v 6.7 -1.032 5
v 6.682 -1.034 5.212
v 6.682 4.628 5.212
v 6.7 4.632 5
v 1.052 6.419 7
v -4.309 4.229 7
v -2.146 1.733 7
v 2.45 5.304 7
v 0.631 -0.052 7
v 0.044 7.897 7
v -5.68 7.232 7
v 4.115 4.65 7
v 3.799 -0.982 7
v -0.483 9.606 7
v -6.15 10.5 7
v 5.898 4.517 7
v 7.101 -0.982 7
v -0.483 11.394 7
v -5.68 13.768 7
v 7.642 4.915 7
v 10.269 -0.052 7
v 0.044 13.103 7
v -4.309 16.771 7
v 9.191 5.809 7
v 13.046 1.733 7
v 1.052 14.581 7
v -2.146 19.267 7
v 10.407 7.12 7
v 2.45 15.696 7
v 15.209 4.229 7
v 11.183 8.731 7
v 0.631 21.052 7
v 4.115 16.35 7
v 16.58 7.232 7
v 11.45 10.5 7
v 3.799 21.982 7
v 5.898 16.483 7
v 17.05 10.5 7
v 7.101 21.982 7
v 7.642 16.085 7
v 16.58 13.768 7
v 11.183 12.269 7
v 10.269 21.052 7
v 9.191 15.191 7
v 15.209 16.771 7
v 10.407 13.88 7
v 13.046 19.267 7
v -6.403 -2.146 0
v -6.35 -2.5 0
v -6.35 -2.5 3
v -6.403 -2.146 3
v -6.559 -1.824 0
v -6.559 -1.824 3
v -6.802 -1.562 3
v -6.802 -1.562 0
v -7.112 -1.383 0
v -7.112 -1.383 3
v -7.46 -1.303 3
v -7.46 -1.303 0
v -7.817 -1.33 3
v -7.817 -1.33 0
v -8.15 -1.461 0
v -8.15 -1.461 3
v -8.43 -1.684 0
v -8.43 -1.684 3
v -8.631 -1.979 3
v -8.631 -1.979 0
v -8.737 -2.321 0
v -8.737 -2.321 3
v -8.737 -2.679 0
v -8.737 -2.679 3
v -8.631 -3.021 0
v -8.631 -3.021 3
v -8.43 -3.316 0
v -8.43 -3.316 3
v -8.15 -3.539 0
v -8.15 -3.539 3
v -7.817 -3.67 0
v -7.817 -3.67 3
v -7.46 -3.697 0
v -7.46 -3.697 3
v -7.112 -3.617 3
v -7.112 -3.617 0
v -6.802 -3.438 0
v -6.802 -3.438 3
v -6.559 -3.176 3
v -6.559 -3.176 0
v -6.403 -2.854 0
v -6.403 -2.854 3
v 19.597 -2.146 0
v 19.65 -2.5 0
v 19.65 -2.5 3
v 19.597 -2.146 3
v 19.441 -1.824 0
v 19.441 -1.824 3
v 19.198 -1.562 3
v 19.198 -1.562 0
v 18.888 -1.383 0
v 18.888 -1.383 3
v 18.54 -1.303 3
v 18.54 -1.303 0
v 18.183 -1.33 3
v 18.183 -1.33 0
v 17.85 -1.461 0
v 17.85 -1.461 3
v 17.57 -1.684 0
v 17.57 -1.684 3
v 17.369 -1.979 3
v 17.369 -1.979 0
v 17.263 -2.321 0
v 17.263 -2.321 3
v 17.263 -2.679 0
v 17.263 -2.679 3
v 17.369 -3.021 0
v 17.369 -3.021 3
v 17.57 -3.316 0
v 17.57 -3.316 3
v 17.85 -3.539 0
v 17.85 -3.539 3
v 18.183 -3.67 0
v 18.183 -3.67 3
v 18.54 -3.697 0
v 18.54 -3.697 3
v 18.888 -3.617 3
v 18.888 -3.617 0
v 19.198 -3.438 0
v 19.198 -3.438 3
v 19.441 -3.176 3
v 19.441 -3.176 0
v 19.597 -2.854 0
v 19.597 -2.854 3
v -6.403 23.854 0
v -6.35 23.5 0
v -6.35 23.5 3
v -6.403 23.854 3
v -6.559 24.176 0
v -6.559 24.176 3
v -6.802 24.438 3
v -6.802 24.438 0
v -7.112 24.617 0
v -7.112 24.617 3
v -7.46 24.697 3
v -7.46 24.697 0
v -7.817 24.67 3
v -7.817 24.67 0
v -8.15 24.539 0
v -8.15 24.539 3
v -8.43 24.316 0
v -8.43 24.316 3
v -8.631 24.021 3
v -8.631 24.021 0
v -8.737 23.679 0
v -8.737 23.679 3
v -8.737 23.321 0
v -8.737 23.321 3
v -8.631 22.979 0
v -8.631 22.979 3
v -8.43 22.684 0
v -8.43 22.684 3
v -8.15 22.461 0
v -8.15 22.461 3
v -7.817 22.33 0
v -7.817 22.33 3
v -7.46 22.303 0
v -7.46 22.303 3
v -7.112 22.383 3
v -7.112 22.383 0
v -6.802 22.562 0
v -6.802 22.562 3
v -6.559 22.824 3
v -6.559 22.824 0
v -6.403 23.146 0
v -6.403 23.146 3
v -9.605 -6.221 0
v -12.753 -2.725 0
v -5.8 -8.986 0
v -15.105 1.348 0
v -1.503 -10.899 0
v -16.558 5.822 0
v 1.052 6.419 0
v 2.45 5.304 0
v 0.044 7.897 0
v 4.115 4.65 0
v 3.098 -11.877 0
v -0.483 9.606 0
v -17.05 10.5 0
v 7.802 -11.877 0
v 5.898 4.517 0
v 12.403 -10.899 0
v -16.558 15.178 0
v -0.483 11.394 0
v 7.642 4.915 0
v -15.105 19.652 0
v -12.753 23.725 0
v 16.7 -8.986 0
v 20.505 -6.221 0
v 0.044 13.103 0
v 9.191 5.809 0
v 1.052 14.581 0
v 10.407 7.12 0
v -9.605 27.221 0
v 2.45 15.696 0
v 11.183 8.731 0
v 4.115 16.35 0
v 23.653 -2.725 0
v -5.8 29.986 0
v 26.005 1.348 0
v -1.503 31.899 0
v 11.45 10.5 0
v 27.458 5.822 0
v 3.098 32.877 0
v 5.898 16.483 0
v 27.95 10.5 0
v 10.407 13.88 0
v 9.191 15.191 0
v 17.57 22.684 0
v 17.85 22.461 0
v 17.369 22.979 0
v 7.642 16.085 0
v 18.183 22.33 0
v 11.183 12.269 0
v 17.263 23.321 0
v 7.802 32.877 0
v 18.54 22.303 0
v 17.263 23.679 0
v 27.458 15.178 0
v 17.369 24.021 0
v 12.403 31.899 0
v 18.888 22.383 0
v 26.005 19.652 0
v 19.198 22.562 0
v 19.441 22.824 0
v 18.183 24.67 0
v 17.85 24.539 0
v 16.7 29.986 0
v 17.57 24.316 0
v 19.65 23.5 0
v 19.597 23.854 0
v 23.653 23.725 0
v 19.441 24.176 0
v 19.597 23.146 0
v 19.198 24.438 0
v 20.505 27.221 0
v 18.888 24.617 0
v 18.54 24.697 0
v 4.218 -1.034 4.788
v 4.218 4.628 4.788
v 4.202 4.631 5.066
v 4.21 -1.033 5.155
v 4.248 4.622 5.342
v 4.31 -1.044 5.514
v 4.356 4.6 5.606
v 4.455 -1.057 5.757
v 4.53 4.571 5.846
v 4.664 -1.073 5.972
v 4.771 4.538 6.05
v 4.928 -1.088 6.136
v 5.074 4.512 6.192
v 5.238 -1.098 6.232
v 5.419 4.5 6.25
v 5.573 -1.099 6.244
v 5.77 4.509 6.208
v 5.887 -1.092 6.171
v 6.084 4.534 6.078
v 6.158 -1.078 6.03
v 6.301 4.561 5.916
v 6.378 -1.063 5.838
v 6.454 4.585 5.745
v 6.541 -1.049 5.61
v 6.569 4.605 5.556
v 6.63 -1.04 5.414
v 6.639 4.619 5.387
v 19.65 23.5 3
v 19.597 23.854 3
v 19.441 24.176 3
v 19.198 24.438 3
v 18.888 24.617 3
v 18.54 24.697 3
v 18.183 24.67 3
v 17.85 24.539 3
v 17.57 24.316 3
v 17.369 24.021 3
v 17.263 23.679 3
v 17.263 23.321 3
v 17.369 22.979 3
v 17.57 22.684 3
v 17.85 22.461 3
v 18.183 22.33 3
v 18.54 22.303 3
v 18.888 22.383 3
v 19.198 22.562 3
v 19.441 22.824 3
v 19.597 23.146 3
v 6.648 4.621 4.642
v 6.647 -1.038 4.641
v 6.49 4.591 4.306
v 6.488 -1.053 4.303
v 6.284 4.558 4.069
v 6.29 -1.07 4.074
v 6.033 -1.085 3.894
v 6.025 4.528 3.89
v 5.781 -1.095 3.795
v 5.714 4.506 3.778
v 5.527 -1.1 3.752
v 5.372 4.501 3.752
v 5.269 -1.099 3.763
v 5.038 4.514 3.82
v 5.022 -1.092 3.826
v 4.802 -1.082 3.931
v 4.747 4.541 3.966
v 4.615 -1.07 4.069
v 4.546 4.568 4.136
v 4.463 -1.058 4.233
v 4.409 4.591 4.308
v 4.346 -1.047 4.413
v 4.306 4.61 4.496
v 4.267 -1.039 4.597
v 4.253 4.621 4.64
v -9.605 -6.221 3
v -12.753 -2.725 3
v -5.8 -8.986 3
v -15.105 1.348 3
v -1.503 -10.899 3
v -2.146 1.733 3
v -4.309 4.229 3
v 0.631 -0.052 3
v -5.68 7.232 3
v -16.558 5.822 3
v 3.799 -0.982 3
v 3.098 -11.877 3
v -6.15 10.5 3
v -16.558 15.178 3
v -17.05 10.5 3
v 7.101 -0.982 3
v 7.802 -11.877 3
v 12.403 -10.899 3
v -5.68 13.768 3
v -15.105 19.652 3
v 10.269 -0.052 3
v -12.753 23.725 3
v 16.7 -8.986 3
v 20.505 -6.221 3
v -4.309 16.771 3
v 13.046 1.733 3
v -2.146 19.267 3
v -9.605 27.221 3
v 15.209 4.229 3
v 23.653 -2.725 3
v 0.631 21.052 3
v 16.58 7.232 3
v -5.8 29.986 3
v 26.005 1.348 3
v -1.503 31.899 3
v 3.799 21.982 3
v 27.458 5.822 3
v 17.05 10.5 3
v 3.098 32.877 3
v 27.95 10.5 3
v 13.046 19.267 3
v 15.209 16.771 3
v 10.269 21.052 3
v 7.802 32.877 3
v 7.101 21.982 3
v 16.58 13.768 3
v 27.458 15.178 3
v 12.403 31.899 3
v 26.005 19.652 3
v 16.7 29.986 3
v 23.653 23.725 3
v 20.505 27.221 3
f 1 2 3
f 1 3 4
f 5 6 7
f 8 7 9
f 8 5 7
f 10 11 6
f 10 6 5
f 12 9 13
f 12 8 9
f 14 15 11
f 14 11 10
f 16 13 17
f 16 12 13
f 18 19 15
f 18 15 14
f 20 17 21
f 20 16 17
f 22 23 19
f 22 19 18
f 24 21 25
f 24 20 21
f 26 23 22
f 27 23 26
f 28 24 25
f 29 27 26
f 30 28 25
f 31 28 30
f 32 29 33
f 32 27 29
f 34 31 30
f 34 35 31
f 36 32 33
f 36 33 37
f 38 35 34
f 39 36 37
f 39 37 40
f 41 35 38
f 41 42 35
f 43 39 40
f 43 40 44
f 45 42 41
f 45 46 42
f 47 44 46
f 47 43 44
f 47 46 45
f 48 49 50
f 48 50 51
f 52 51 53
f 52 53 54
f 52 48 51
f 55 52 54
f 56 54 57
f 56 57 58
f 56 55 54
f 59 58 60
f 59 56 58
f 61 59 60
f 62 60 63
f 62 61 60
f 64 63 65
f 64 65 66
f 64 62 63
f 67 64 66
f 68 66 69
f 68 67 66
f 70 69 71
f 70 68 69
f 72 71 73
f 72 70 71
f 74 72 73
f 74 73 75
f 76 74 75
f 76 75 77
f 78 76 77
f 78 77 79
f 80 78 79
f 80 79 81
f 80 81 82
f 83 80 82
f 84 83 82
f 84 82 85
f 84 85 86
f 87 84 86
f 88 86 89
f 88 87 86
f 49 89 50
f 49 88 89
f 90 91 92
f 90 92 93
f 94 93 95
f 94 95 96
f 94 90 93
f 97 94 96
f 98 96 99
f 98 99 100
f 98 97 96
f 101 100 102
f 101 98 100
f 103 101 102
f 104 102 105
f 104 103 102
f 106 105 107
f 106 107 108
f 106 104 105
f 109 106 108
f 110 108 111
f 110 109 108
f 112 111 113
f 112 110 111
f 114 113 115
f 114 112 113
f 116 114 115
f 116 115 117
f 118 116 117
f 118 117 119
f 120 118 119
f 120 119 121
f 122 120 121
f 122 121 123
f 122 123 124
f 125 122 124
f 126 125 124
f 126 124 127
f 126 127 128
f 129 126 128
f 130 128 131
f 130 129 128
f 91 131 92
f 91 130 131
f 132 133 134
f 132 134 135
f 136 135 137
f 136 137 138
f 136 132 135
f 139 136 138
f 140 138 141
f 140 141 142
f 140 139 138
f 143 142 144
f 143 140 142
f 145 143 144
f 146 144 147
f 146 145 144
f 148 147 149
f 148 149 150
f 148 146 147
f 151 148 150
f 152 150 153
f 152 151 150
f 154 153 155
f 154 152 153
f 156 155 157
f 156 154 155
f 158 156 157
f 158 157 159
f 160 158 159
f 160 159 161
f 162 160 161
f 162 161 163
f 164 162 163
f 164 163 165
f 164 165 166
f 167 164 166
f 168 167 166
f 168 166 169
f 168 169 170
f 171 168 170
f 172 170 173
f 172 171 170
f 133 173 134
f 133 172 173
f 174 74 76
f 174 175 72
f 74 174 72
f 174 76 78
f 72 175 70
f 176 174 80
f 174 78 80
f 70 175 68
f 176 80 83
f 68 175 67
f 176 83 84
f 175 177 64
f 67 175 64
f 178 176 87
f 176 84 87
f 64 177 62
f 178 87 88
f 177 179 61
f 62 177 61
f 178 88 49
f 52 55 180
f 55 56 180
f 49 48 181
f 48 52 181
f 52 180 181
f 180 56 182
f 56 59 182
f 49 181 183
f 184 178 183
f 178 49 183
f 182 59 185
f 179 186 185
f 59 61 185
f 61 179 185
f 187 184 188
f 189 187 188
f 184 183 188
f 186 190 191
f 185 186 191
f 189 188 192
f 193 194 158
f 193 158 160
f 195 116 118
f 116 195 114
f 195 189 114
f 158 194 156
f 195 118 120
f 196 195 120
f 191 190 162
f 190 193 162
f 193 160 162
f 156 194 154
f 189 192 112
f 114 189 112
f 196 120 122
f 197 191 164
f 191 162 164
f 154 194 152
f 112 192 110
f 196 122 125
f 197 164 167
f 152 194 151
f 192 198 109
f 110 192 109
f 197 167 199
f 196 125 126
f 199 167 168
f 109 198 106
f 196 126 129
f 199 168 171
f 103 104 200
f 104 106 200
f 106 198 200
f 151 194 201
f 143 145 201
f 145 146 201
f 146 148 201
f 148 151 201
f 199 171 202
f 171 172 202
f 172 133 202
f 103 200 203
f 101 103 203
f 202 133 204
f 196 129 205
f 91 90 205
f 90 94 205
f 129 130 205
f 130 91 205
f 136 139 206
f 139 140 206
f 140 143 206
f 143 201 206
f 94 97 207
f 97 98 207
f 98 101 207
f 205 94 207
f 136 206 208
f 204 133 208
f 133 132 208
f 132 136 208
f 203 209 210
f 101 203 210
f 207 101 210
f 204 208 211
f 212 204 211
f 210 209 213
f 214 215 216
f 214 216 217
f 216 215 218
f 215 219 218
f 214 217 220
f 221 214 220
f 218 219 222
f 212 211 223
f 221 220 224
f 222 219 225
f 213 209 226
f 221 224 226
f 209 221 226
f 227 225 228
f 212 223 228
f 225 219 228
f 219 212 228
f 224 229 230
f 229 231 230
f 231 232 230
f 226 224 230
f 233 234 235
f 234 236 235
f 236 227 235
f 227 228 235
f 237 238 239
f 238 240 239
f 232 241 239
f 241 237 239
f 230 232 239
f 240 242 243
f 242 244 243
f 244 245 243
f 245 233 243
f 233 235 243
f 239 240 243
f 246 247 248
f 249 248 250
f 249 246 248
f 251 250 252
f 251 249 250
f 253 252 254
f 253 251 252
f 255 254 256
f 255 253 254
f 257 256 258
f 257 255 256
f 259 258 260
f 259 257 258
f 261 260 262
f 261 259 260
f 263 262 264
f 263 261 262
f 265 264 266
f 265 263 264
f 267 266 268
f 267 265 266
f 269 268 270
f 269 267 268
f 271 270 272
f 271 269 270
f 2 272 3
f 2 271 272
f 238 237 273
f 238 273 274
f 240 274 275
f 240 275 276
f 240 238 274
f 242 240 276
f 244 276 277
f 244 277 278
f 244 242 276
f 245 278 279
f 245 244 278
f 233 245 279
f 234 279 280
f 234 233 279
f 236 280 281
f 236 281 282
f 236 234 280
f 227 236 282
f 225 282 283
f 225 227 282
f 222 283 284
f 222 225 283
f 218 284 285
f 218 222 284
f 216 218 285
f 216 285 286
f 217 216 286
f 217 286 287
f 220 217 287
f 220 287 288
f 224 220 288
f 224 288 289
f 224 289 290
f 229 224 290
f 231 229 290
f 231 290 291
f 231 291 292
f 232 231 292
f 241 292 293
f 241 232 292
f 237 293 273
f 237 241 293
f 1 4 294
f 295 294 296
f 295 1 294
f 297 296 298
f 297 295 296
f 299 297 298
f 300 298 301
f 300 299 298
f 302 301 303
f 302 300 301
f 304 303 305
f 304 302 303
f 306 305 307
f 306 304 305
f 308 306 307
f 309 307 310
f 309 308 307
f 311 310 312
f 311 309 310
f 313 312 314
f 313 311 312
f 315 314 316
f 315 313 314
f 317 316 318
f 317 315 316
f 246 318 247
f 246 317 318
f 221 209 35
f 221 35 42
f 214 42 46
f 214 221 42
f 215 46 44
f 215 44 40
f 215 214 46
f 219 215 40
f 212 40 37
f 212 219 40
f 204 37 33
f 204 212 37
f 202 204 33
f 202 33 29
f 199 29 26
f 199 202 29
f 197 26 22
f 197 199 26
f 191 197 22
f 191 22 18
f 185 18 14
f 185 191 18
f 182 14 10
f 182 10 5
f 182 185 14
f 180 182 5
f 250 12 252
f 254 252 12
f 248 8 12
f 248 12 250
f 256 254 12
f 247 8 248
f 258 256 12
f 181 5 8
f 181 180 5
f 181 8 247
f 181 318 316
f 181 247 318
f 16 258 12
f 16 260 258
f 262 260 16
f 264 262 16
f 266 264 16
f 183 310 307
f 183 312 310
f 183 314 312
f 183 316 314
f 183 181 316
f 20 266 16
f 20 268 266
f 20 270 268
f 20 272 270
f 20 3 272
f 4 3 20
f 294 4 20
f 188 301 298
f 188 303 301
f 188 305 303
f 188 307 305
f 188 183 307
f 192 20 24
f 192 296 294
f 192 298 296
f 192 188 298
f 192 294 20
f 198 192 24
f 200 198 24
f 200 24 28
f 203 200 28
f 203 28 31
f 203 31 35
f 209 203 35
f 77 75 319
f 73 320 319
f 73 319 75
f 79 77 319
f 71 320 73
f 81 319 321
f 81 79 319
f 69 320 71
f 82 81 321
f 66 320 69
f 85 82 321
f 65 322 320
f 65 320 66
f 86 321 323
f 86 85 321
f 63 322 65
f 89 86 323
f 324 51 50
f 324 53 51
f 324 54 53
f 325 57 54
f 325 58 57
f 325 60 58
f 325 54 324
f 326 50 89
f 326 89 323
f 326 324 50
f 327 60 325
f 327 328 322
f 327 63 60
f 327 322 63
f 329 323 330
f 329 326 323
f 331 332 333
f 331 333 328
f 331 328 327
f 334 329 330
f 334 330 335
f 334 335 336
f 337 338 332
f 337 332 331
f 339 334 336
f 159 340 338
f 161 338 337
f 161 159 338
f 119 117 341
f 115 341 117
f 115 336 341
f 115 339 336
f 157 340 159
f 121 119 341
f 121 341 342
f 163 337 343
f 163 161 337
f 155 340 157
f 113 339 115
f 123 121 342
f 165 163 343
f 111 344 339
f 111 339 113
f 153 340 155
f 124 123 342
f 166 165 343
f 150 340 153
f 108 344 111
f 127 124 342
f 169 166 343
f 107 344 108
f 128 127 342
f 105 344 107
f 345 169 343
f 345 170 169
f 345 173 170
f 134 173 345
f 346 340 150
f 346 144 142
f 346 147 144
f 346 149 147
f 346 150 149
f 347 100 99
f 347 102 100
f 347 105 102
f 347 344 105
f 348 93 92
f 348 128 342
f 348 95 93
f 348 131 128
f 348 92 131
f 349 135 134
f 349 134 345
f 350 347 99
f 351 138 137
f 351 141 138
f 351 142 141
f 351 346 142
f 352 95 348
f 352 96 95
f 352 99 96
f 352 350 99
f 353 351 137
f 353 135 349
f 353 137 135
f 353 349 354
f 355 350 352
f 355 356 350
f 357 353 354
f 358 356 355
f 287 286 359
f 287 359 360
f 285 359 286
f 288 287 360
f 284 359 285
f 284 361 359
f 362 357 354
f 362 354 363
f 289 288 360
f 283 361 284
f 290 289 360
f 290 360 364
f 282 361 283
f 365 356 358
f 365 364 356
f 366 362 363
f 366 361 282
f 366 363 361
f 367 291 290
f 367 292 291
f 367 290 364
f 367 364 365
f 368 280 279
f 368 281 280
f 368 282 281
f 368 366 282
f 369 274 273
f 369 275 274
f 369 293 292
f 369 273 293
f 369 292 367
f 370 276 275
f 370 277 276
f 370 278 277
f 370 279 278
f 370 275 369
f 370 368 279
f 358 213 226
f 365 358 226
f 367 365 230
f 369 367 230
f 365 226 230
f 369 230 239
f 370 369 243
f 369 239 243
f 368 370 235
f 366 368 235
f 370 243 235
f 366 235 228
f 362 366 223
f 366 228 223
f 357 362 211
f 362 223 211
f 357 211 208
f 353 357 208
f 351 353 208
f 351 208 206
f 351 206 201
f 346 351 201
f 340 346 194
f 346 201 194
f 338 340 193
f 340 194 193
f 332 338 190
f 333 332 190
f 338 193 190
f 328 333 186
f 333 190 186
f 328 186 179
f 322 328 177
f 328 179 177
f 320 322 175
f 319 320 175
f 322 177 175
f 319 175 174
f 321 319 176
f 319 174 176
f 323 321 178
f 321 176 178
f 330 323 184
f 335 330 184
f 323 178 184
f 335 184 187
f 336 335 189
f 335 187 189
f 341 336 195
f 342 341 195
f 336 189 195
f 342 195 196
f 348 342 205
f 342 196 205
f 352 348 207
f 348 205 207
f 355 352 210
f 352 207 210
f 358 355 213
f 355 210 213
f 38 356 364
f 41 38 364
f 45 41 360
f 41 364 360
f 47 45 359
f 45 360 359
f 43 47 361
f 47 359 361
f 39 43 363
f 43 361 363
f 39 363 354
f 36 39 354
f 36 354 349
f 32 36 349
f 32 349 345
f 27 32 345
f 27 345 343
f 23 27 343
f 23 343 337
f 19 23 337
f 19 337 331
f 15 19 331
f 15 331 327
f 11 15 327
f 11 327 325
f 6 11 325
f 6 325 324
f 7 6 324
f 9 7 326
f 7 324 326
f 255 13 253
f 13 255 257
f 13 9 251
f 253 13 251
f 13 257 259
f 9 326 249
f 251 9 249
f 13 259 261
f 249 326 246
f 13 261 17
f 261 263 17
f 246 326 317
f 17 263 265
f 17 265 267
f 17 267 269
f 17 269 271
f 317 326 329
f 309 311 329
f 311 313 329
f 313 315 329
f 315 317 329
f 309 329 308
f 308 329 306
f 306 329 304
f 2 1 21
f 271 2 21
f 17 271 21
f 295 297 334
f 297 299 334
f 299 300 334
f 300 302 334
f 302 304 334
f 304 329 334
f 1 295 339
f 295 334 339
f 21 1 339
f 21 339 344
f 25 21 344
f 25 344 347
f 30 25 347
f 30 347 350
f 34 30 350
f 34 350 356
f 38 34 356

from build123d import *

# Parameters (mm, degrees)
SKETCH_1_R               = 22.5
SKETCH_1_R_2             = 6
SKETCH_1_R_3             = 1.2
EXTRUDE_1_DEPTH          = 3
SKETCH_3_R               = 11.6
SKETCH_3_R_2             = 7.6
EXTRUDE_2_DEPTH          = 4.2
CUT_EXTRUDE_START        = -0.2
SKETCH_4_R               = 11.6
CUT_EXTRUDE_1_DEPTH      = 0.2
SKETCH_5_R               = 7.6
SKETCH_5_R_2             = 6
EXTRUDE_3_DEPTH          = 4
CUT_EXTRUDE_2_DEPTH      = 10
CUT_EXTRUDE_2_DEPTH_BACK = 10


with BuildPart() as part:
    # 草图1 → 凸台-拉伸1 (new body)
    with BuildSketch(Plane.XY):
        with Locations((5.45, 10.5)):
            Circle(SKETCH_1_R)
        with Locations((5.45, 10.5)):
            Circle(SKETCH_1_R_2, mode=Mode.SUBTRACT)
        with Locations((-7.55, -2.5)):
            Circle(SKETCH_1_R_3, mode=Mode.SUBTRACT)
        with Locations((-7.55, 23.5)):
            Circle(SKETCH_1_R_3, mode=Mode.SUBTRACT)
        with Locations((18.45, 23.5)):
            Circle(SKETCH_1_R_3, mode=Mode.SUBTRACT)
        with Locations((18.45, -2.5)):
            Circle(SKETCH_1_R_3, mode=Mode.SUBTRACT)
    extrude(amount=EXTRUDE_1_DEPTH)

    # 草图3 → 凸台-拉伸2 (add)
    with BuildSketch(Plane.XY.offset(3)):
        with Locations((5.45, 10.5)):
            Circle(SKETCH_3_R)
        with Locations((5.45, 10.5)):
            Circle(SKETCH_3_R_2, mode=Mode.SUBTRACT)
    extrude(amount=EXTRUDE_2_DEPTH)

    # 草图4 → 切除-拉伸1 (cut)
    with BuildSketch(Plane.XY.offset(7.2).offset(CUT_EXTRUDE_START)):
        with Locations((5.45, 10.5)):
            Circle(SKETCH_4_R)
    extrude(amount=CUT_EXTRUDE_1_DEPTH, mode=Mode.SUBTRACT)

    # 草图5 → 凸台-拉伸3 (add)
    with BuildSketch(Plane.XY.offset(3)):
        with Locations((5.45, 10.5)):
            Circle(SKETCH_5_R)
        with Locations((5.45, 10.5)):
            Circle(SKETCH_5_R_2, mode=Mode.SUBTRACT)
    extrude(amount=EXTRUDE_3_DEPTH)

    # 草图6 → 切除-拉伸2 (cut, two sides: drawn at the far end of the back side and taken through both)
    with BuildSketch(Plane(origin=(0, 0, 0), x_dir=(1, 0, 0), z_dir=(0, 1, 0)).offset(-CUT_EXTRUDE_2_DEPTH_BACK)):
        with BuildLine():
            ThreePointArc((6.7, -5), (5.556579945, -3.754552002), (4.218174855, -4.787616354))
            Line((4.218174855, -4.787616354), (6.681825145, -5.212383646))
            ThreePointArc((6.681825145, -5.212383646), (6.695447998, -5.106579945), (6.7, -5))
        make_face()
        with BuildLine():
            Line((6.681825145, -5.212383646), (4.218174855, -4.787616354))
            ThreePointArc((4.218174855, -4.787616354), (5.237616354, -6.231825145), (6.681825145, -5.212383646))
        make_face()
    extrude(amount=CUT_EXTRUDE_2_DEPTH + CUT_EXTRUDE_2_DEPTH_BACK, mode=Mode.SUBTRACT)


solid = part.part
